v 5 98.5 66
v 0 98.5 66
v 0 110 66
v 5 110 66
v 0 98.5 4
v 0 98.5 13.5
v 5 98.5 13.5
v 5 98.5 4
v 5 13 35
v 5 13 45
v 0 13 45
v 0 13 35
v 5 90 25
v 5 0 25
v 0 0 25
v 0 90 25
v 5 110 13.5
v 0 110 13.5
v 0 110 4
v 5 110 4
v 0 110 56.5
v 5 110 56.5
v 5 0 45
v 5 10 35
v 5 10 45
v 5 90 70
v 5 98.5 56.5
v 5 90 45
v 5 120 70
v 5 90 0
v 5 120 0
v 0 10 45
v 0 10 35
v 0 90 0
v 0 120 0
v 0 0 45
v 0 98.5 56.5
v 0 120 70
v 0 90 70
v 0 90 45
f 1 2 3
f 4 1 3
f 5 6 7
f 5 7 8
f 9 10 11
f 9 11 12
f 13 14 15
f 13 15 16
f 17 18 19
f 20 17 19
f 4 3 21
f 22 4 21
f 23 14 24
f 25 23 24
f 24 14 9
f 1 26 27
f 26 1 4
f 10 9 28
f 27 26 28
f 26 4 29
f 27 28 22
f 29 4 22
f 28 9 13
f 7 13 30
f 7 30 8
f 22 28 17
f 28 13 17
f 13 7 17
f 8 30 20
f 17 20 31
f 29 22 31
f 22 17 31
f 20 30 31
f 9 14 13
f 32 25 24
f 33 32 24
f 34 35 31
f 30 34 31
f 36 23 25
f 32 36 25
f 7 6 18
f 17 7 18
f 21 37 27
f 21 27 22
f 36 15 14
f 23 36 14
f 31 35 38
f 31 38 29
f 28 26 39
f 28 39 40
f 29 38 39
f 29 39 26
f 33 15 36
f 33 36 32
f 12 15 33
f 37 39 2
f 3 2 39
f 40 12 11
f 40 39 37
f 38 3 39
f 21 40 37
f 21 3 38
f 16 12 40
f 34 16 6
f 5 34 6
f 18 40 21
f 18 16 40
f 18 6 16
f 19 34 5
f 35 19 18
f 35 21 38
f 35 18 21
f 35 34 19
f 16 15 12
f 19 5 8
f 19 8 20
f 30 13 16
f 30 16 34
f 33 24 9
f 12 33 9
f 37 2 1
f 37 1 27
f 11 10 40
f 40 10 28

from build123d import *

# Parameters (mm, degrees)
SKETCH1_W           = 5
SKETCH1_H           = 120
BOSS_EXTRUDE1_DEPTH = 70
SKETCH2_W           = 35
SKETCH2_H           = 3
CUT_EXTRUDE1_DEPTH  = 6
SKETCH3_W           = 9.5
SKETCH3_H           = 11.5
CUT_EXTRUDE2_DEPTH  = 6
SKETCH5_W           = 25
SKETCH5_H           = 90
CUT_EXTRUDE3_DEPTH  = 10


with BuildPart() as part:
    # Sketch1 → Boss-Extrude1 (new body)
    with BuildSketch(Plane.XY):
        with Locations((2.5, 60)):
            Rectangle(SKETCH1_W, SKETCH1_H)
    extrude(amount=BOSS_EXTRUDE1_DEPTH)

    # Sketch2 → Cut-Extrude1 (cut, through all)
    with BuildSketch(Plane(origin=(5, 0, 0), x_dir=(0, 0, -1), z_dir=(1, 0, 0))):
        with Locations((-52.5, 11.5)):
            Rectangle(SKETCH2_W, SKETCH2_H)
    extrude(amount=-CUT_EXTRUDE1_DEPTH, mode=Mode.SUBTRACT)

    # Sketch3 → Cut-Extrude2 (cut, through all)
    with BuildSketch(Plane(origin=(0, 0, 0), x_dir=(0, 0, -1), z_dir=(1, 0, 0))):
        with Locations((-8.75, 104.25)):
            Rectangle(SKETCH3_W, SKETCH3_H)
        with Locations((-61.25, 104.25)):
            Rectangle(SKETCH3_W, SKETCH3_H)
    extrude(amount=CUT_EXTRUDE2_DEPTH, mode=Mode.SUBTRACT)

    # Sketch5 → Cut-Extrude3 (cut)
    with BuildSketch(Plane(origin=(5, 0, 0), x_dir=(0, 0, -1), z_dir=(1, 0, 0))):
        with Locations((-57.5, 45)):
            Rectangle(SKETCH5_W, SKETCH5_H)
        with Locations((-12.5, 45)):
            Rectangle(SKETCH5_W, SKETCH5_H)
    extrude(amount=-CUT_EXTRUDE3_DEPTH, mode=Mode.SUBTRACT)


solid = part.part
